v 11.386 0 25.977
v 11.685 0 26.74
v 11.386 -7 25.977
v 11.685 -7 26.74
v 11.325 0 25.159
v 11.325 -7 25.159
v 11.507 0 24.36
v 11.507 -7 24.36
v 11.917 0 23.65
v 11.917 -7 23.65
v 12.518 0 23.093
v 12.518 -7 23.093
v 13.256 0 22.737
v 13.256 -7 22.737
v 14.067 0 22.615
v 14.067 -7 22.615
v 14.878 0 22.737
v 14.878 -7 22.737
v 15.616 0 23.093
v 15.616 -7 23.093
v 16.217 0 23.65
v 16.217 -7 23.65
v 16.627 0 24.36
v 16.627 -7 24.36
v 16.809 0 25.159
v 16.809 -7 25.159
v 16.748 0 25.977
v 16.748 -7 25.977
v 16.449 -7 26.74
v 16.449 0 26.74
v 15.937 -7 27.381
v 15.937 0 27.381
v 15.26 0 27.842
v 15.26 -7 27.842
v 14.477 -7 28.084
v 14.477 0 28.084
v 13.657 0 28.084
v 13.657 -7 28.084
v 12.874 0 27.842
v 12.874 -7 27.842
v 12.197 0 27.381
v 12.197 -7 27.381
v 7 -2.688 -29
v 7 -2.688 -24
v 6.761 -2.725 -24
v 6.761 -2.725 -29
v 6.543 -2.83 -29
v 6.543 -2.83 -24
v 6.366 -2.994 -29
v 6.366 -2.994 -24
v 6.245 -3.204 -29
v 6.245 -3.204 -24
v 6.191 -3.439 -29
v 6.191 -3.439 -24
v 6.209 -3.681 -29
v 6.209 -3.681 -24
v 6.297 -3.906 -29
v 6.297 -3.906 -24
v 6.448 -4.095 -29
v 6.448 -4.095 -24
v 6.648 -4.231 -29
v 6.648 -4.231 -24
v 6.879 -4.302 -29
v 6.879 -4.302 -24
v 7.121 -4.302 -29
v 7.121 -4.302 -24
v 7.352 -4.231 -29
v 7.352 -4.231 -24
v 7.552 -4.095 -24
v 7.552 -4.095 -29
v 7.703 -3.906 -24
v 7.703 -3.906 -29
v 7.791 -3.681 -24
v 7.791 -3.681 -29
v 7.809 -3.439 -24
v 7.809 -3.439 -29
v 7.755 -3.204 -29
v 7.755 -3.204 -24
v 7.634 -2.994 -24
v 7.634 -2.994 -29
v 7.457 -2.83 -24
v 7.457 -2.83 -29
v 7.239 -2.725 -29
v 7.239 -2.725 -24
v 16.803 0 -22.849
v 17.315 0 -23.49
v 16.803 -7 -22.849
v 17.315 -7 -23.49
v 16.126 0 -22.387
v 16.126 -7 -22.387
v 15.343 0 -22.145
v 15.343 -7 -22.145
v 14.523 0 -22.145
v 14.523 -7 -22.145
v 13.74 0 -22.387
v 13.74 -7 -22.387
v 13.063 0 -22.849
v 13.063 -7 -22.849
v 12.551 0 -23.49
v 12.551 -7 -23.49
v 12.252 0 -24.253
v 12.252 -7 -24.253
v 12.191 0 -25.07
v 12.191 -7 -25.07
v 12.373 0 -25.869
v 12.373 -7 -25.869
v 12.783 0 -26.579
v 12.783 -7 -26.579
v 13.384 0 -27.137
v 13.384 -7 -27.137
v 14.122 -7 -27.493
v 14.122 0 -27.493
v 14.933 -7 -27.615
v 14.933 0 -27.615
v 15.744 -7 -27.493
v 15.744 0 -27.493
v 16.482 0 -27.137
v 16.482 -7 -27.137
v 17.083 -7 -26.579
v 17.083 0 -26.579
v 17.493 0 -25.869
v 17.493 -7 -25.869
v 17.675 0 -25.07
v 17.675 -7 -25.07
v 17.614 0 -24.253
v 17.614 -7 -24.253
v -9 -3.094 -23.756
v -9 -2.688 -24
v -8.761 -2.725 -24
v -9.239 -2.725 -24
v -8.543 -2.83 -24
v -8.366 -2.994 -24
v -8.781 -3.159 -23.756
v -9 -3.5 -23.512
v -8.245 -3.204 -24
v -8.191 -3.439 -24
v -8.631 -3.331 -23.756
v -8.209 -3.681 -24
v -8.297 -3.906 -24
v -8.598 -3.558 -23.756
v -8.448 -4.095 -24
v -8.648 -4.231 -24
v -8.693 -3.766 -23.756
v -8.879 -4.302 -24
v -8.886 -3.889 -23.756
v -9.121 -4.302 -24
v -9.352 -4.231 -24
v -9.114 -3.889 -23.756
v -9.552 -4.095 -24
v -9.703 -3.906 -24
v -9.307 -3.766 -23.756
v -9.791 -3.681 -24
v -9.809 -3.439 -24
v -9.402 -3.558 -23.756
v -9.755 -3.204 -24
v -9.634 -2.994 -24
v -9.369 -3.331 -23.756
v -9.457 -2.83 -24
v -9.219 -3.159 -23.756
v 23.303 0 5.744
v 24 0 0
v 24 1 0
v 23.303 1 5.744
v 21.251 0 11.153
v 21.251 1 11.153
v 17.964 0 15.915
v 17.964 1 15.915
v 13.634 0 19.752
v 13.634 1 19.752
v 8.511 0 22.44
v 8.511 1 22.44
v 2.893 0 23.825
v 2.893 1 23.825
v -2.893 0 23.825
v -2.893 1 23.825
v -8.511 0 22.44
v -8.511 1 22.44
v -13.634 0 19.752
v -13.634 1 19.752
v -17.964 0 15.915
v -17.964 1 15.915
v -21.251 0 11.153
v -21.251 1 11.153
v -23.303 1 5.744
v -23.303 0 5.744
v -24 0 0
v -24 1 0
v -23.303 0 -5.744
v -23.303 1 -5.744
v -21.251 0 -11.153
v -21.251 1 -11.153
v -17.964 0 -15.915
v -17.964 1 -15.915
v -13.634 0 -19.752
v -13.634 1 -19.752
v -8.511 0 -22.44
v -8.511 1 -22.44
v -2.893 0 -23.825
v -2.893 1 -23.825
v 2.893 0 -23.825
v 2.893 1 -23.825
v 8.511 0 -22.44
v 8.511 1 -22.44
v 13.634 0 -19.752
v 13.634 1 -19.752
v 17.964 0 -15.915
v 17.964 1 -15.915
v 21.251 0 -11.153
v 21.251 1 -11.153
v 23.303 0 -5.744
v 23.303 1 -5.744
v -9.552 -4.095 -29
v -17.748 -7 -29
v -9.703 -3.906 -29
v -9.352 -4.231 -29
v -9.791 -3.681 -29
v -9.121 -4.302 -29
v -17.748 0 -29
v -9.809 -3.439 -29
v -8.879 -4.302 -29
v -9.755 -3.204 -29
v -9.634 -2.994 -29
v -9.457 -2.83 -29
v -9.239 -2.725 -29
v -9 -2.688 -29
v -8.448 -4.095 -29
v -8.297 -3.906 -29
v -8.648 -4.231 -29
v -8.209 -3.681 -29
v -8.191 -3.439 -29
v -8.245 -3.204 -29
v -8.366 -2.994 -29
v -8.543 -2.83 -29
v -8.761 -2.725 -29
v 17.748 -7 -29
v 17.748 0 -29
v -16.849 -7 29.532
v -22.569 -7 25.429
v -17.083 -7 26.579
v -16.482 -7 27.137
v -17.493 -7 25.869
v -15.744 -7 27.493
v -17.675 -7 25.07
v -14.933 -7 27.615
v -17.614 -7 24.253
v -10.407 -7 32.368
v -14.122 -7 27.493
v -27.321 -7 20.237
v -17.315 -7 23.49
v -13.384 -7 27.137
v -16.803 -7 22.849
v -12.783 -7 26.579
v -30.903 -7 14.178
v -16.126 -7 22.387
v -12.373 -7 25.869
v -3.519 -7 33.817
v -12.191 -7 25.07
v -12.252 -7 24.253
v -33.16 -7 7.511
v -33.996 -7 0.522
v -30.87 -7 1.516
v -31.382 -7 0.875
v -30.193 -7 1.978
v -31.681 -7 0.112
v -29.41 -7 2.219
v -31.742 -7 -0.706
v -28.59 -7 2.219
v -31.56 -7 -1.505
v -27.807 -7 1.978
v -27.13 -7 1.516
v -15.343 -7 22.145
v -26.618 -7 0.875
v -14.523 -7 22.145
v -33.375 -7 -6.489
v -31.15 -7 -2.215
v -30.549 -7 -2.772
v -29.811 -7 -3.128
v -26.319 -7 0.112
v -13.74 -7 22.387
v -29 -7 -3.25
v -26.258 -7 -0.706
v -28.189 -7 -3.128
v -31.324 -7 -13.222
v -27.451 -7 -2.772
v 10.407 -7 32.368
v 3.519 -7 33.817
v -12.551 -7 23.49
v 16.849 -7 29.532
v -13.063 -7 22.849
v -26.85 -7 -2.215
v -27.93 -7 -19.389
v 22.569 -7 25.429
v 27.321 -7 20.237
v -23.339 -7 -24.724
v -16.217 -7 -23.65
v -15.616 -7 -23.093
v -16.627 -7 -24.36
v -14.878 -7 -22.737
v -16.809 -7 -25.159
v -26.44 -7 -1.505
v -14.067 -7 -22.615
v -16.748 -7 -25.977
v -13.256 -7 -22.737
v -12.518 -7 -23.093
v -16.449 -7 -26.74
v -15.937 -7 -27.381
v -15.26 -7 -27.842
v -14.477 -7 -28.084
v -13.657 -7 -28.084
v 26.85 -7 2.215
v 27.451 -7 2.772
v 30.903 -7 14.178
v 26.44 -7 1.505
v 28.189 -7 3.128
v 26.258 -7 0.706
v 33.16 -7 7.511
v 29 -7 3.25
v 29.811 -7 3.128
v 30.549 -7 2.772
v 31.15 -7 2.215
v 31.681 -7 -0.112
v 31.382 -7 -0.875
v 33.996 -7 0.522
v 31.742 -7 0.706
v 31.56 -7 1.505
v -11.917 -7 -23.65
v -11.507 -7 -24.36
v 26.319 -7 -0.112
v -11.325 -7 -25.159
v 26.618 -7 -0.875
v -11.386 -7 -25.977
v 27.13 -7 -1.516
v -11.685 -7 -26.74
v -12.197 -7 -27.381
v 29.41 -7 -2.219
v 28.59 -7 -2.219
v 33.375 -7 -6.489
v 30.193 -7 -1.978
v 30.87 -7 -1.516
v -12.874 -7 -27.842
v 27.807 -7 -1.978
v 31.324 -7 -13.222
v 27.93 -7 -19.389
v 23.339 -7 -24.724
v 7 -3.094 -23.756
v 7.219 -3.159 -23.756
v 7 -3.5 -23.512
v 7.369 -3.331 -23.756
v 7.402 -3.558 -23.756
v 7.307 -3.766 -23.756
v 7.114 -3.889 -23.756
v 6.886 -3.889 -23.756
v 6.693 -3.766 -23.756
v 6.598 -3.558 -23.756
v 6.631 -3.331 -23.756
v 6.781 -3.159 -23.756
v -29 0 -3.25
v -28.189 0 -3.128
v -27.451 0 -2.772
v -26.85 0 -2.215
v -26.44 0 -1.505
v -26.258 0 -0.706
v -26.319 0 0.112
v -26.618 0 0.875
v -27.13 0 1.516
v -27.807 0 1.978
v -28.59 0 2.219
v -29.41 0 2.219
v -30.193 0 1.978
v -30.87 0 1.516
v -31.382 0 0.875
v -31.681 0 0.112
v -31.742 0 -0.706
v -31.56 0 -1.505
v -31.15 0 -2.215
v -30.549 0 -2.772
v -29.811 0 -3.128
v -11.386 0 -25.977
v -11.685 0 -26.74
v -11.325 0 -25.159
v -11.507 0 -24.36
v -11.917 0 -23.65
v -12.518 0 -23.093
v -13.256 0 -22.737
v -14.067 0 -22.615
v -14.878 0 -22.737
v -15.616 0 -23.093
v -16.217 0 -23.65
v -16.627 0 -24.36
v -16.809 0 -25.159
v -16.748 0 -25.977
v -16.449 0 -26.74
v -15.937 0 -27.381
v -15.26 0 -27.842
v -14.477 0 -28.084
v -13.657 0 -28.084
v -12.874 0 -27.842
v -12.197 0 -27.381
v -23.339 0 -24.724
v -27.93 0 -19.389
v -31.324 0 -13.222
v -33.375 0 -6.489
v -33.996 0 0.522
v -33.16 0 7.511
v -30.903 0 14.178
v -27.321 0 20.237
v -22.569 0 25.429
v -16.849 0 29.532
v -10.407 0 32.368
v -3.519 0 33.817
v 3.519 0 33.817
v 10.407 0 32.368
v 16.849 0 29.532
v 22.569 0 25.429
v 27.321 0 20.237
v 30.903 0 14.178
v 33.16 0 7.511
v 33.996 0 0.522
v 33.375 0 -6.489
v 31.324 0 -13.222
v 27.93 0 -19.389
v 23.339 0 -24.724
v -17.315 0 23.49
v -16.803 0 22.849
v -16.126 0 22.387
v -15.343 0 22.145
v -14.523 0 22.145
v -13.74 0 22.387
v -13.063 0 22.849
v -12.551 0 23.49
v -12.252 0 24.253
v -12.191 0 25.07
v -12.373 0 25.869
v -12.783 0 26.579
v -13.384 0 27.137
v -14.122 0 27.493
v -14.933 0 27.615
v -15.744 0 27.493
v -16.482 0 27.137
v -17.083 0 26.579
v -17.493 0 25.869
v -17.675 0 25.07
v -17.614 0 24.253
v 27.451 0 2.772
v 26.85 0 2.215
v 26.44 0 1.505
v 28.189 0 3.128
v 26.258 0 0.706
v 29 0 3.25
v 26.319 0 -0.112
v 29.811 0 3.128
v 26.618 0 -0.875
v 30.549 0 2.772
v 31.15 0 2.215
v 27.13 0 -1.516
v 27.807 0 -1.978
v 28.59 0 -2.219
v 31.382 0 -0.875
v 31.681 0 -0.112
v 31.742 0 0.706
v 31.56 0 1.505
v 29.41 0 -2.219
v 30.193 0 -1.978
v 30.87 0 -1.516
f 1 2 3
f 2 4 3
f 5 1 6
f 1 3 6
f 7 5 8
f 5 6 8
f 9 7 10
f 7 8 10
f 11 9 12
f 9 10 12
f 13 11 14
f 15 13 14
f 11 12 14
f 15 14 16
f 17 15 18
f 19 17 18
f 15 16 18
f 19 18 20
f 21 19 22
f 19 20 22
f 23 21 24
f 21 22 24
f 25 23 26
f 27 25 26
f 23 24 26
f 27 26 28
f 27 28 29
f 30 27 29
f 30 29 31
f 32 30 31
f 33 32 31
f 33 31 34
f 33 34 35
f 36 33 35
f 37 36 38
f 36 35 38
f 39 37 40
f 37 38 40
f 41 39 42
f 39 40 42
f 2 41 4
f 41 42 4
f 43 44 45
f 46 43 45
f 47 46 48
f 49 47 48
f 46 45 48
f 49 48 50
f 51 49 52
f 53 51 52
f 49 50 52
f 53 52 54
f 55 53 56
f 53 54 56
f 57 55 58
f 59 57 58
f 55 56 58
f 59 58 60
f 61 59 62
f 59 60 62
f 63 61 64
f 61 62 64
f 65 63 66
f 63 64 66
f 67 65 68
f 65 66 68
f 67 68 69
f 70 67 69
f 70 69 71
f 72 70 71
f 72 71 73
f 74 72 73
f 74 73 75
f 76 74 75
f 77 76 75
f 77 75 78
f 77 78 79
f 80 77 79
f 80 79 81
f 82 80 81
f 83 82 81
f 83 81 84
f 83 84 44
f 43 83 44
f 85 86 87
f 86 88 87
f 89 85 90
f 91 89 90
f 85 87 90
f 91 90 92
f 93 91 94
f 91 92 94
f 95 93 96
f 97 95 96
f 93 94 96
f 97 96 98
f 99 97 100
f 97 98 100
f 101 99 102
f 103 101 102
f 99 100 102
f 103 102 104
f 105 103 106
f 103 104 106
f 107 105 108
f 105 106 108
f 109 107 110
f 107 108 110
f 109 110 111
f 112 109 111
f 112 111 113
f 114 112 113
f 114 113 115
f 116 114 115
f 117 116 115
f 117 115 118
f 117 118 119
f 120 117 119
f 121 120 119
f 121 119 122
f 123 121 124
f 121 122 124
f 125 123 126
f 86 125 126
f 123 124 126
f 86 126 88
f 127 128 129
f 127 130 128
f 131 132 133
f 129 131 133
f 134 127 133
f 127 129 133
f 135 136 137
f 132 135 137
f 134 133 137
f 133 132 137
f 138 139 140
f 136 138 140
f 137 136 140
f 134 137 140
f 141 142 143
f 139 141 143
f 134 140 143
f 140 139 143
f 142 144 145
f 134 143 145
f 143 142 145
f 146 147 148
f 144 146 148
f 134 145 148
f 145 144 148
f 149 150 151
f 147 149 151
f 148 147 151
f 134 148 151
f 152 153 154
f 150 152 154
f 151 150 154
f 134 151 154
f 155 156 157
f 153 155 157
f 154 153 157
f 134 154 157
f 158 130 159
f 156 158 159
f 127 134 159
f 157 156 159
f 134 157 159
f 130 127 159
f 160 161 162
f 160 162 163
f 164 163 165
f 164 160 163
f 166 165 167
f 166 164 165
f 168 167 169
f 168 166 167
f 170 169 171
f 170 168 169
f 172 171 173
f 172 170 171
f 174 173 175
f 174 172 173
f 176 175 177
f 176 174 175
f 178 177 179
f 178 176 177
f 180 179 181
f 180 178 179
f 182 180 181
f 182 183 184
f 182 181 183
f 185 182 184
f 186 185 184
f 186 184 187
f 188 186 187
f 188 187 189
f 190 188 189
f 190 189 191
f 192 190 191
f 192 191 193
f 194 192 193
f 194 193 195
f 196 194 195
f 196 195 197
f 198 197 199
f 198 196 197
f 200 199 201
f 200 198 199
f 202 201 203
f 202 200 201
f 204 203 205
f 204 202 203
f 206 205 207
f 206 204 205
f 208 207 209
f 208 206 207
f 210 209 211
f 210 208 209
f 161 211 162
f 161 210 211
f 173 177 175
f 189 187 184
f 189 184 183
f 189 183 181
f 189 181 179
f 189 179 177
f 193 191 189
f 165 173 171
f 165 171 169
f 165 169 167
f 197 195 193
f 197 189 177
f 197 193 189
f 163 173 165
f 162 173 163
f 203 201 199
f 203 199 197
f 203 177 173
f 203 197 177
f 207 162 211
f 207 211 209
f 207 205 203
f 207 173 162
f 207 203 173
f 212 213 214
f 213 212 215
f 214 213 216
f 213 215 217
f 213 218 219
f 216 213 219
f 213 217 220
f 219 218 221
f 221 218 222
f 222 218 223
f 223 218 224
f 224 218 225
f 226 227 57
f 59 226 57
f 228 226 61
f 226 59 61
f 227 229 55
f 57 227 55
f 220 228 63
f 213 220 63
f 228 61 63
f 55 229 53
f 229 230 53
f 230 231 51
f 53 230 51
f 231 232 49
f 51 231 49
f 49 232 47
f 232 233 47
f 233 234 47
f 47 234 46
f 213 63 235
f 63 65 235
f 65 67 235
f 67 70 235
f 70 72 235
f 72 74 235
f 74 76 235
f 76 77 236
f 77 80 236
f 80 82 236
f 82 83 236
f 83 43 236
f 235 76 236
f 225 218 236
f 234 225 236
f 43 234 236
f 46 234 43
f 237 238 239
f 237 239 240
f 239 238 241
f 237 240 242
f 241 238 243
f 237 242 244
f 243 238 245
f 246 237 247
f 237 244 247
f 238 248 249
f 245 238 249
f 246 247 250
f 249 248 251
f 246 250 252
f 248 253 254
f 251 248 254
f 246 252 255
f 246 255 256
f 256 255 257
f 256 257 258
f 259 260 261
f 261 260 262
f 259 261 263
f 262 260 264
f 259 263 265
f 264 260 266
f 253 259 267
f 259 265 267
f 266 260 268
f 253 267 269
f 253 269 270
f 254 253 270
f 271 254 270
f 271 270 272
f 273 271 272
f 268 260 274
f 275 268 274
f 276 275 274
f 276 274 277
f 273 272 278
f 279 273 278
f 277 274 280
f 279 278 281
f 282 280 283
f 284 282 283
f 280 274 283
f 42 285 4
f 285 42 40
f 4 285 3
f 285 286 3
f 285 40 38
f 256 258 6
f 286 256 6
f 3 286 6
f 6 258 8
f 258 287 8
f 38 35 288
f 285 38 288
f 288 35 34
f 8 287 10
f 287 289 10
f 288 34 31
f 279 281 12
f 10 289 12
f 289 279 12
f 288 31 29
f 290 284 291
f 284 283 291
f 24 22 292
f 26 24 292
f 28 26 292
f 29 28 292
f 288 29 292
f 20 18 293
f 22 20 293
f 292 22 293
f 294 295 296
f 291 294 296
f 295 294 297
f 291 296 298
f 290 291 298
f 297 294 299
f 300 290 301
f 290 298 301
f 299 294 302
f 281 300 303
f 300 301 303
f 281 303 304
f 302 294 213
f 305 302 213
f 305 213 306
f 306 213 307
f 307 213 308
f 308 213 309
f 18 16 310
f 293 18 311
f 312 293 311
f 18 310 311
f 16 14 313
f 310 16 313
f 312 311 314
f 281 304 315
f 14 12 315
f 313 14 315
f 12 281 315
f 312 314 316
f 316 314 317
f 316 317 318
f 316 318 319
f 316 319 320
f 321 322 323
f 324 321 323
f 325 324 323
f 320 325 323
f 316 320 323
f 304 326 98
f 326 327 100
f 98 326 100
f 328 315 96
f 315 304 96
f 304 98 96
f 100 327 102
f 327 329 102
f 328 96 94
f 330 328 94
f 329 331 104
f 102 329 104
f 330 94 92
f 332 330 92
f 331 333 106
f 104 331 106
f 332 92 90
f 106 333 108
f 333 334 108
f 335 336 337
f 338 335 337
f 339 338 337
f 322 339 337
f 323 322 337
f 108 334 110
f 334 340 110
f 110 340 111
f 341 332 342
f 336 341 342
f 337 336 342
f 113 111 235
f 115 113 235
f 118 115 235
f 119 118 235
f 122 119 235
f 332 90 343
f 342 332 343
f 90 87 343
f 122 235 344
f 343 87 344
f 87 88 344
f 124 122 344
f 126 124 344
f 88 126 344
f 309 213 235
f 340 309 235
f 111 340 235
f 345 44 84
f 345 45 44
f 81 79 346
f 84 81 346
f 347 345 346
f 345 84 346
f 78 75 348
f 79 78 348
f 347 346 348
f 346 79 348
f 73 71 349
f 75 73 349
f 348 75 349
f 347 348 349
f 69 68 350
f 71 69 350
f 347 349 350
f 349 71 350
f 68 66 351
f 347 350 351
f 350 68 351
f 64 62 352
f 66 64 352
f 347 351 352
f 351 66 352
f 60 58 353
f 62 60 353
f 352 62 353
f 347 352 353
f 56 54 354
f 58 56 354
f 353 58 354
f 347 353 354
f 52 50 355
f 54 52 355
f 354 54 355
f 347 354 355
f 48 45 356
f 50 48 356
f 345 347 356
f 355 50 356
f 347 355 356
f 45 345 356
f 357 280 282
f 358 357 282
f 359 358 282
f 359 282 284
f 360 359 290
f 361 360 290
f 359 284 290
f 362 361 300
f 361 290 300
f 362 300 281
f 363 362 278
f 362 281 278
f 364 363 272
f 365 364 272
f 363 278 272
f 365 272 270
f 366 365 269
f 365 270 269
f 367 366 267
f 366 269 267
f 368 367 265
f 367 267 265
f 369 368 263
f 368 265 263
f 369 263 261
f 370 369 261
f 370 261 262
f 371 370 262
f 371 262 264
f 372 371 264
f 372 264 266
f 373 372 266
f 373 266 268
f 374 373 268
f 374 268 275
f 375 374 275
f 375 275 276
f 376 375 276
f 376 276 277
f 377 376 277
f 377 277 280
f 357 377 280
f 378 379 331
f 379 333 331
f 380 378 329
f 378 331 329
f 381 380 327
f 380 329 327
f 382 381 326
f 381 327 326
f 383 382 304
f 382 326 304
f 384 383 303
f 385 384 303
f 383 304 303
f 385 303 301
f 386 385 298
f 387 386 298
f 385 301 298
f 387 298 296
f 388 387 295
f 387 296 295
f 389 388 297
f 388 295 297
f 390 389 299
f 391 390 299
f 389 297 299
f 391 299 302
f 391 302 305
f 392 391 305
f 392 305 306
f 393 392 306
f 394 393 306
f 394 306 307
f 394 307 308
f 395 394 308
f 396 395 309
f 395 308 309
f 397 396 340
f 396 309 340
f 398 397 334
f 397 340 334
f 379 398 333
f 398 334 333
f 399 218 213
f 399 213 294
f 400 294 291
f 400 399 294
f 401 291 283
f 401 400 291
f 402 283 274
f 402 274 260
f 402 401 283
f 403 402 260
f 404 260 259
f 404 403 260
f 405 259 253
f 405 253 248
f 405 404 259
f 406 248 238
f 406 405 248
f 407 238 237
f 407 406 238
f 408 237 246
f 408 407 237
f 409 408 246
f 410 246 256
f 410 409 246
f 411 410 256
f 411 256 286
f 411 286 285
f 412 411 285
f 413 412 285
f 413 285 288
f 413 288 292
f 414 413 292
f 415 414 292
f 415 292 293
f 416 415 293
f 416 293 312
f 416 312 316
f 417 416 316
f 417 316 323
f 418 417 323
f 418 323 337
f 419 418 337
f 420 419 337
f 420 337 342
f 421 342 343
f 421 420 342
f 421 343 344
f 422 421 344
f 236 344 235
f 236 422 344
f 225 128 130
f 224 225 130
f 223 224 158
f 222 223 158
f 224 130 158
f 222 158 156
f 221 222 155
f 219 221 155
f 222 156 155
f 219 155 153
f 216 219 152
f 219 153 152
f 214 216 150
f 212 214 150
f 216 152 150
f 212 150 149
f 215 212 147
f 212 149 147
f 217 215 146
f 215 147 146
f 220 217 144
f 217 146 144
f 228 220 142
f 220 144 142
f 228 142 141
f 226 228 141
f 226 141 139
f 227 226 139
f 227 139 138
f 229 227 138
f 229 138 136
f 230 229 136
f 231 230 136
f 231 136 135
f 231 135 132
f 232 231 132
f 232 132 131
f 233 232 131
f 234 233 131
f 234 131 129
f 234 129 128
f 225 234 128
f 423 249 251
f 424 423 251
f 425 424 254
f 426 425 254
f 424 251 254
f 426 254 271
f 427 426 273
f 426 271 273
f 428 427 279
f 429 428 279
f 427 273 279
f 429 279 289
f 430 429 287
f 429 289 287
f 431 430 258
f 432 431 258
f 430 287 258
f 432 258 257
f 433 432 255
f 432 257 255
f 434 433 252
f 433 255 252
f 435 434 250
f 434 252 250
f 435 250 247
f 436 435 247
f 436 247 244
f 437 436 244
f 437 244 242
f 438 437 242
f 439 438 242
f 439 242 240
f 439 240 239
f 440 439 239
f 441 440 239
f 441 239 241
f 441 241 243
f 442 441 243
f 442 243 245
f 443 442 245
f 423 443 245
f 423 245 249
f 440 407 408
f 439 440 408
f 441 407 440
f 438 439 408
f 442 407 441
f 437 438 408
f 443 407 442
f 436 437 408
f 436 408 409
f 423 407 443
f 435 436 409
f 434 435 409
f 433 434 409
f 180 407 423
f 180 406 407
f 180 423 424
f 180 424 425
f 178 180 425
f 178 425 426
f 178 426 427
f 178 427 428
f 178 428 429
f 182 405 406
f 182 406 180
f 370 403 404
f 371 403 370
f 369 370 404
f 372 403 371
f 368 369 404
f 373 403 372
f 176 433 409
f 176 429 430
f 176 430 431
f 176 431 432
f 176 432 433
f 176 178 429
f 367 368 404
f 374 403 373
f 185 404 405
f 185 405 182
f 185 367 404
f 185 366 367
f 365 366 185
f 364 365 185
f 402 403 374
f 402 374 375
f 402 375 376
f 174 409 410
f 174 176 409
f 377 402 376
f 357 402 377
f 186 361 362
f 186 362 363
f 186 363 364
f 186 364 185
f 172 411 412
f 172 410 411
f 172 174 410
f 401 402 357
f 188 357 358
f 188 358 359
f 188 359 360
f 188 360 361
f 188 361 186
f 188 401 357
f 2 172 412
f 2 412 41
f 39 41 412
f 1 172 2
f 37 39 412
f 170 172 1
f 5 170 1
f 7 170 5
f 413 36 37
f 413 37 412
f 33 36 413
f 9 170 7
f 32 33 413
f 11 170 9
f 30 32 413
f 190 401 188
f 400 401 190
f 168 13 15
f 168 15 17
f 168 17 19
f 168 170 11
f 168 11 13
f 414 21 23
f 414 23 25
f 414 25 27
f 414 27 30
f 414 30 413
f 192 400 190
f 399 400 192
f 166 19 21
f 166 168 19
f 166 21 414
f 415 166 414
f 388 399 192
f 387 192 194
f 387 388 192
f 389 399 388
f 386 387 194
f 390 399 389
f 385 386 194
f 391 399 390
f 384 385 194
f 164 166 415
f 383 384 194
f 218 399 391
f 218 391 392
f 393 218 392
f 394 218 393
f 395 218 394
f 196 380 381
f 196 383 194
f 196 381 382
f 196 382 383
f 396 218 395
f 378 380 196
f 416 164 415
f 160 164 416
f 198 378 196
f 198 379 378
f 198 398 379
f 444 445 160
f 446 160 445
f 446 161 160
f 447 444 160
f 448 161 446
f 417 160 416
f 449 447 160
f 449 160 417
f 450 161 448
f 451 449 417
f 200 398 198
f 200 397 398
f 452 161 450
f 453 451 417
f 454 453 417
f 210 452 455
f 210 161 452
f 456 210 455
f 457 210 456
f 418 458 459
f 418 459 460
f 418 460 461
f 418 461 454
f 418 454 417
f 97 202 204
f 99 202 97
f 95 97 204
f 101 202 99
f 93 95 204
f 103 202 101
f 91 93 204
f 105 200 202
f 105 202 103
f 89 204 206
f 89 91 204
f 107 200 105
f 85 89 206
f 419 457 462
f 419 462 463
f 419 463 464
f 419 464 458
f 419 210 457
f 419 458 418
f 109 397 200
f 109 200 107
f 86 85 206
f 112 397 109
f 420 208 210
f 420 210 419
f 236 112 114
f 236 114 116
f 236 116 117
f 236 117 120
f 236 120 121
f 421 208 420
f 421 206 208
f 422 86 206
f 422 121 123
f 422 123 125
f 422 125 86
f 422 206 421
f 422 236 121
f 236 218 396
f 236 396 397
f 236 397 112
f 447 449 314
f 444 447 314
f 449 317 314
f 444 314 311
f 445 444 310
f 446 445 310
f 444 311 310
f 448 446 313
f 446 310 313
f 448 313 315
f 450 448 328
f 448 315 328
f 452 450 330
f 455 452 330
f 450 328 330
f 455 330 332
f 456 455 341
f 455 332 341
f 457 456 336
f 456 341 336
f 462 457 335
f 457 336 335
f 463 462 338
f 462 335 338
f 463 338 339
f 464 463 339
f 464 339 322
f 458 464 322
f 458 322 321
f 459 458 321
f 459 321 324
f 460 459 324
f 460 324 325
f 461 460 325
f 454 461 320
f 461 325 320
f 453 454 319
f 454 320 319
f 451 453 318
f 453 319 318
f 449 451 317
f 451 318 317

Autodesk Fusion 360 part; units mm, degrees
sketch "Sketch1" plane through (0, 0, 0) normal (0, 1, 0) x (1, 0, 0)
  circle A0 centre (0, 0) radius 34
  line L0 (-17.7482, 29) -> (17.7482, 29)
  circle A1 centre (0, 0) radius 29 construction
  circle A2 centre (0, 0) radius 24
  point P0 (29, 0)
  dimension "d1" = 68
  dimension "d2" = 29
  dimension "d3" = 58
  dimension "d4" = 48
extrude "Extrude1" add sketch "Sketch1" against normal blind 7 contours A0 L0 | A2 picked at (0.5978, 27.311)
extrude "Extrude2" add sketch "Sketch1" along normal blind 1 contours A2
hole "Hole1" at (29, 0, 0.5) direction (0, -1, 0) diameter 5.5 end through all
pattern_circular "C-Pattern1" count 6 over 360 about axis through (0, 1.75, 0) along (0, 1, 0) of "Hole1"
sketch "Sketch2" plane through (0, 0, -29) normal (0, 0, -1) x (-1, 0, 0)
  line L0 (17.7482, 0) -> (-17.7482, 0)
  line L1 (-17.7482, 0) -> (-17.7482, -7)
  line L2 (-17.7482, -7) -> (17.7482, -7)
  line L3 (17.7482, -7) -> (17.7482, 0)
  line L4 (9, -3.5) -> (-7, -3.5) construction
  point P0 (9, -3.5)
  point P1 (-7, -3.5)
  dimension "d14" = 3.5
hole "Hole2" at (-9, -3.5, -29) at (7, -3.5, -29) direction (0, 0, 1) diameter 1.623 depth 5 tip angle 118
equation "d4 = ( 24 * 2 ) * 1 mm"
